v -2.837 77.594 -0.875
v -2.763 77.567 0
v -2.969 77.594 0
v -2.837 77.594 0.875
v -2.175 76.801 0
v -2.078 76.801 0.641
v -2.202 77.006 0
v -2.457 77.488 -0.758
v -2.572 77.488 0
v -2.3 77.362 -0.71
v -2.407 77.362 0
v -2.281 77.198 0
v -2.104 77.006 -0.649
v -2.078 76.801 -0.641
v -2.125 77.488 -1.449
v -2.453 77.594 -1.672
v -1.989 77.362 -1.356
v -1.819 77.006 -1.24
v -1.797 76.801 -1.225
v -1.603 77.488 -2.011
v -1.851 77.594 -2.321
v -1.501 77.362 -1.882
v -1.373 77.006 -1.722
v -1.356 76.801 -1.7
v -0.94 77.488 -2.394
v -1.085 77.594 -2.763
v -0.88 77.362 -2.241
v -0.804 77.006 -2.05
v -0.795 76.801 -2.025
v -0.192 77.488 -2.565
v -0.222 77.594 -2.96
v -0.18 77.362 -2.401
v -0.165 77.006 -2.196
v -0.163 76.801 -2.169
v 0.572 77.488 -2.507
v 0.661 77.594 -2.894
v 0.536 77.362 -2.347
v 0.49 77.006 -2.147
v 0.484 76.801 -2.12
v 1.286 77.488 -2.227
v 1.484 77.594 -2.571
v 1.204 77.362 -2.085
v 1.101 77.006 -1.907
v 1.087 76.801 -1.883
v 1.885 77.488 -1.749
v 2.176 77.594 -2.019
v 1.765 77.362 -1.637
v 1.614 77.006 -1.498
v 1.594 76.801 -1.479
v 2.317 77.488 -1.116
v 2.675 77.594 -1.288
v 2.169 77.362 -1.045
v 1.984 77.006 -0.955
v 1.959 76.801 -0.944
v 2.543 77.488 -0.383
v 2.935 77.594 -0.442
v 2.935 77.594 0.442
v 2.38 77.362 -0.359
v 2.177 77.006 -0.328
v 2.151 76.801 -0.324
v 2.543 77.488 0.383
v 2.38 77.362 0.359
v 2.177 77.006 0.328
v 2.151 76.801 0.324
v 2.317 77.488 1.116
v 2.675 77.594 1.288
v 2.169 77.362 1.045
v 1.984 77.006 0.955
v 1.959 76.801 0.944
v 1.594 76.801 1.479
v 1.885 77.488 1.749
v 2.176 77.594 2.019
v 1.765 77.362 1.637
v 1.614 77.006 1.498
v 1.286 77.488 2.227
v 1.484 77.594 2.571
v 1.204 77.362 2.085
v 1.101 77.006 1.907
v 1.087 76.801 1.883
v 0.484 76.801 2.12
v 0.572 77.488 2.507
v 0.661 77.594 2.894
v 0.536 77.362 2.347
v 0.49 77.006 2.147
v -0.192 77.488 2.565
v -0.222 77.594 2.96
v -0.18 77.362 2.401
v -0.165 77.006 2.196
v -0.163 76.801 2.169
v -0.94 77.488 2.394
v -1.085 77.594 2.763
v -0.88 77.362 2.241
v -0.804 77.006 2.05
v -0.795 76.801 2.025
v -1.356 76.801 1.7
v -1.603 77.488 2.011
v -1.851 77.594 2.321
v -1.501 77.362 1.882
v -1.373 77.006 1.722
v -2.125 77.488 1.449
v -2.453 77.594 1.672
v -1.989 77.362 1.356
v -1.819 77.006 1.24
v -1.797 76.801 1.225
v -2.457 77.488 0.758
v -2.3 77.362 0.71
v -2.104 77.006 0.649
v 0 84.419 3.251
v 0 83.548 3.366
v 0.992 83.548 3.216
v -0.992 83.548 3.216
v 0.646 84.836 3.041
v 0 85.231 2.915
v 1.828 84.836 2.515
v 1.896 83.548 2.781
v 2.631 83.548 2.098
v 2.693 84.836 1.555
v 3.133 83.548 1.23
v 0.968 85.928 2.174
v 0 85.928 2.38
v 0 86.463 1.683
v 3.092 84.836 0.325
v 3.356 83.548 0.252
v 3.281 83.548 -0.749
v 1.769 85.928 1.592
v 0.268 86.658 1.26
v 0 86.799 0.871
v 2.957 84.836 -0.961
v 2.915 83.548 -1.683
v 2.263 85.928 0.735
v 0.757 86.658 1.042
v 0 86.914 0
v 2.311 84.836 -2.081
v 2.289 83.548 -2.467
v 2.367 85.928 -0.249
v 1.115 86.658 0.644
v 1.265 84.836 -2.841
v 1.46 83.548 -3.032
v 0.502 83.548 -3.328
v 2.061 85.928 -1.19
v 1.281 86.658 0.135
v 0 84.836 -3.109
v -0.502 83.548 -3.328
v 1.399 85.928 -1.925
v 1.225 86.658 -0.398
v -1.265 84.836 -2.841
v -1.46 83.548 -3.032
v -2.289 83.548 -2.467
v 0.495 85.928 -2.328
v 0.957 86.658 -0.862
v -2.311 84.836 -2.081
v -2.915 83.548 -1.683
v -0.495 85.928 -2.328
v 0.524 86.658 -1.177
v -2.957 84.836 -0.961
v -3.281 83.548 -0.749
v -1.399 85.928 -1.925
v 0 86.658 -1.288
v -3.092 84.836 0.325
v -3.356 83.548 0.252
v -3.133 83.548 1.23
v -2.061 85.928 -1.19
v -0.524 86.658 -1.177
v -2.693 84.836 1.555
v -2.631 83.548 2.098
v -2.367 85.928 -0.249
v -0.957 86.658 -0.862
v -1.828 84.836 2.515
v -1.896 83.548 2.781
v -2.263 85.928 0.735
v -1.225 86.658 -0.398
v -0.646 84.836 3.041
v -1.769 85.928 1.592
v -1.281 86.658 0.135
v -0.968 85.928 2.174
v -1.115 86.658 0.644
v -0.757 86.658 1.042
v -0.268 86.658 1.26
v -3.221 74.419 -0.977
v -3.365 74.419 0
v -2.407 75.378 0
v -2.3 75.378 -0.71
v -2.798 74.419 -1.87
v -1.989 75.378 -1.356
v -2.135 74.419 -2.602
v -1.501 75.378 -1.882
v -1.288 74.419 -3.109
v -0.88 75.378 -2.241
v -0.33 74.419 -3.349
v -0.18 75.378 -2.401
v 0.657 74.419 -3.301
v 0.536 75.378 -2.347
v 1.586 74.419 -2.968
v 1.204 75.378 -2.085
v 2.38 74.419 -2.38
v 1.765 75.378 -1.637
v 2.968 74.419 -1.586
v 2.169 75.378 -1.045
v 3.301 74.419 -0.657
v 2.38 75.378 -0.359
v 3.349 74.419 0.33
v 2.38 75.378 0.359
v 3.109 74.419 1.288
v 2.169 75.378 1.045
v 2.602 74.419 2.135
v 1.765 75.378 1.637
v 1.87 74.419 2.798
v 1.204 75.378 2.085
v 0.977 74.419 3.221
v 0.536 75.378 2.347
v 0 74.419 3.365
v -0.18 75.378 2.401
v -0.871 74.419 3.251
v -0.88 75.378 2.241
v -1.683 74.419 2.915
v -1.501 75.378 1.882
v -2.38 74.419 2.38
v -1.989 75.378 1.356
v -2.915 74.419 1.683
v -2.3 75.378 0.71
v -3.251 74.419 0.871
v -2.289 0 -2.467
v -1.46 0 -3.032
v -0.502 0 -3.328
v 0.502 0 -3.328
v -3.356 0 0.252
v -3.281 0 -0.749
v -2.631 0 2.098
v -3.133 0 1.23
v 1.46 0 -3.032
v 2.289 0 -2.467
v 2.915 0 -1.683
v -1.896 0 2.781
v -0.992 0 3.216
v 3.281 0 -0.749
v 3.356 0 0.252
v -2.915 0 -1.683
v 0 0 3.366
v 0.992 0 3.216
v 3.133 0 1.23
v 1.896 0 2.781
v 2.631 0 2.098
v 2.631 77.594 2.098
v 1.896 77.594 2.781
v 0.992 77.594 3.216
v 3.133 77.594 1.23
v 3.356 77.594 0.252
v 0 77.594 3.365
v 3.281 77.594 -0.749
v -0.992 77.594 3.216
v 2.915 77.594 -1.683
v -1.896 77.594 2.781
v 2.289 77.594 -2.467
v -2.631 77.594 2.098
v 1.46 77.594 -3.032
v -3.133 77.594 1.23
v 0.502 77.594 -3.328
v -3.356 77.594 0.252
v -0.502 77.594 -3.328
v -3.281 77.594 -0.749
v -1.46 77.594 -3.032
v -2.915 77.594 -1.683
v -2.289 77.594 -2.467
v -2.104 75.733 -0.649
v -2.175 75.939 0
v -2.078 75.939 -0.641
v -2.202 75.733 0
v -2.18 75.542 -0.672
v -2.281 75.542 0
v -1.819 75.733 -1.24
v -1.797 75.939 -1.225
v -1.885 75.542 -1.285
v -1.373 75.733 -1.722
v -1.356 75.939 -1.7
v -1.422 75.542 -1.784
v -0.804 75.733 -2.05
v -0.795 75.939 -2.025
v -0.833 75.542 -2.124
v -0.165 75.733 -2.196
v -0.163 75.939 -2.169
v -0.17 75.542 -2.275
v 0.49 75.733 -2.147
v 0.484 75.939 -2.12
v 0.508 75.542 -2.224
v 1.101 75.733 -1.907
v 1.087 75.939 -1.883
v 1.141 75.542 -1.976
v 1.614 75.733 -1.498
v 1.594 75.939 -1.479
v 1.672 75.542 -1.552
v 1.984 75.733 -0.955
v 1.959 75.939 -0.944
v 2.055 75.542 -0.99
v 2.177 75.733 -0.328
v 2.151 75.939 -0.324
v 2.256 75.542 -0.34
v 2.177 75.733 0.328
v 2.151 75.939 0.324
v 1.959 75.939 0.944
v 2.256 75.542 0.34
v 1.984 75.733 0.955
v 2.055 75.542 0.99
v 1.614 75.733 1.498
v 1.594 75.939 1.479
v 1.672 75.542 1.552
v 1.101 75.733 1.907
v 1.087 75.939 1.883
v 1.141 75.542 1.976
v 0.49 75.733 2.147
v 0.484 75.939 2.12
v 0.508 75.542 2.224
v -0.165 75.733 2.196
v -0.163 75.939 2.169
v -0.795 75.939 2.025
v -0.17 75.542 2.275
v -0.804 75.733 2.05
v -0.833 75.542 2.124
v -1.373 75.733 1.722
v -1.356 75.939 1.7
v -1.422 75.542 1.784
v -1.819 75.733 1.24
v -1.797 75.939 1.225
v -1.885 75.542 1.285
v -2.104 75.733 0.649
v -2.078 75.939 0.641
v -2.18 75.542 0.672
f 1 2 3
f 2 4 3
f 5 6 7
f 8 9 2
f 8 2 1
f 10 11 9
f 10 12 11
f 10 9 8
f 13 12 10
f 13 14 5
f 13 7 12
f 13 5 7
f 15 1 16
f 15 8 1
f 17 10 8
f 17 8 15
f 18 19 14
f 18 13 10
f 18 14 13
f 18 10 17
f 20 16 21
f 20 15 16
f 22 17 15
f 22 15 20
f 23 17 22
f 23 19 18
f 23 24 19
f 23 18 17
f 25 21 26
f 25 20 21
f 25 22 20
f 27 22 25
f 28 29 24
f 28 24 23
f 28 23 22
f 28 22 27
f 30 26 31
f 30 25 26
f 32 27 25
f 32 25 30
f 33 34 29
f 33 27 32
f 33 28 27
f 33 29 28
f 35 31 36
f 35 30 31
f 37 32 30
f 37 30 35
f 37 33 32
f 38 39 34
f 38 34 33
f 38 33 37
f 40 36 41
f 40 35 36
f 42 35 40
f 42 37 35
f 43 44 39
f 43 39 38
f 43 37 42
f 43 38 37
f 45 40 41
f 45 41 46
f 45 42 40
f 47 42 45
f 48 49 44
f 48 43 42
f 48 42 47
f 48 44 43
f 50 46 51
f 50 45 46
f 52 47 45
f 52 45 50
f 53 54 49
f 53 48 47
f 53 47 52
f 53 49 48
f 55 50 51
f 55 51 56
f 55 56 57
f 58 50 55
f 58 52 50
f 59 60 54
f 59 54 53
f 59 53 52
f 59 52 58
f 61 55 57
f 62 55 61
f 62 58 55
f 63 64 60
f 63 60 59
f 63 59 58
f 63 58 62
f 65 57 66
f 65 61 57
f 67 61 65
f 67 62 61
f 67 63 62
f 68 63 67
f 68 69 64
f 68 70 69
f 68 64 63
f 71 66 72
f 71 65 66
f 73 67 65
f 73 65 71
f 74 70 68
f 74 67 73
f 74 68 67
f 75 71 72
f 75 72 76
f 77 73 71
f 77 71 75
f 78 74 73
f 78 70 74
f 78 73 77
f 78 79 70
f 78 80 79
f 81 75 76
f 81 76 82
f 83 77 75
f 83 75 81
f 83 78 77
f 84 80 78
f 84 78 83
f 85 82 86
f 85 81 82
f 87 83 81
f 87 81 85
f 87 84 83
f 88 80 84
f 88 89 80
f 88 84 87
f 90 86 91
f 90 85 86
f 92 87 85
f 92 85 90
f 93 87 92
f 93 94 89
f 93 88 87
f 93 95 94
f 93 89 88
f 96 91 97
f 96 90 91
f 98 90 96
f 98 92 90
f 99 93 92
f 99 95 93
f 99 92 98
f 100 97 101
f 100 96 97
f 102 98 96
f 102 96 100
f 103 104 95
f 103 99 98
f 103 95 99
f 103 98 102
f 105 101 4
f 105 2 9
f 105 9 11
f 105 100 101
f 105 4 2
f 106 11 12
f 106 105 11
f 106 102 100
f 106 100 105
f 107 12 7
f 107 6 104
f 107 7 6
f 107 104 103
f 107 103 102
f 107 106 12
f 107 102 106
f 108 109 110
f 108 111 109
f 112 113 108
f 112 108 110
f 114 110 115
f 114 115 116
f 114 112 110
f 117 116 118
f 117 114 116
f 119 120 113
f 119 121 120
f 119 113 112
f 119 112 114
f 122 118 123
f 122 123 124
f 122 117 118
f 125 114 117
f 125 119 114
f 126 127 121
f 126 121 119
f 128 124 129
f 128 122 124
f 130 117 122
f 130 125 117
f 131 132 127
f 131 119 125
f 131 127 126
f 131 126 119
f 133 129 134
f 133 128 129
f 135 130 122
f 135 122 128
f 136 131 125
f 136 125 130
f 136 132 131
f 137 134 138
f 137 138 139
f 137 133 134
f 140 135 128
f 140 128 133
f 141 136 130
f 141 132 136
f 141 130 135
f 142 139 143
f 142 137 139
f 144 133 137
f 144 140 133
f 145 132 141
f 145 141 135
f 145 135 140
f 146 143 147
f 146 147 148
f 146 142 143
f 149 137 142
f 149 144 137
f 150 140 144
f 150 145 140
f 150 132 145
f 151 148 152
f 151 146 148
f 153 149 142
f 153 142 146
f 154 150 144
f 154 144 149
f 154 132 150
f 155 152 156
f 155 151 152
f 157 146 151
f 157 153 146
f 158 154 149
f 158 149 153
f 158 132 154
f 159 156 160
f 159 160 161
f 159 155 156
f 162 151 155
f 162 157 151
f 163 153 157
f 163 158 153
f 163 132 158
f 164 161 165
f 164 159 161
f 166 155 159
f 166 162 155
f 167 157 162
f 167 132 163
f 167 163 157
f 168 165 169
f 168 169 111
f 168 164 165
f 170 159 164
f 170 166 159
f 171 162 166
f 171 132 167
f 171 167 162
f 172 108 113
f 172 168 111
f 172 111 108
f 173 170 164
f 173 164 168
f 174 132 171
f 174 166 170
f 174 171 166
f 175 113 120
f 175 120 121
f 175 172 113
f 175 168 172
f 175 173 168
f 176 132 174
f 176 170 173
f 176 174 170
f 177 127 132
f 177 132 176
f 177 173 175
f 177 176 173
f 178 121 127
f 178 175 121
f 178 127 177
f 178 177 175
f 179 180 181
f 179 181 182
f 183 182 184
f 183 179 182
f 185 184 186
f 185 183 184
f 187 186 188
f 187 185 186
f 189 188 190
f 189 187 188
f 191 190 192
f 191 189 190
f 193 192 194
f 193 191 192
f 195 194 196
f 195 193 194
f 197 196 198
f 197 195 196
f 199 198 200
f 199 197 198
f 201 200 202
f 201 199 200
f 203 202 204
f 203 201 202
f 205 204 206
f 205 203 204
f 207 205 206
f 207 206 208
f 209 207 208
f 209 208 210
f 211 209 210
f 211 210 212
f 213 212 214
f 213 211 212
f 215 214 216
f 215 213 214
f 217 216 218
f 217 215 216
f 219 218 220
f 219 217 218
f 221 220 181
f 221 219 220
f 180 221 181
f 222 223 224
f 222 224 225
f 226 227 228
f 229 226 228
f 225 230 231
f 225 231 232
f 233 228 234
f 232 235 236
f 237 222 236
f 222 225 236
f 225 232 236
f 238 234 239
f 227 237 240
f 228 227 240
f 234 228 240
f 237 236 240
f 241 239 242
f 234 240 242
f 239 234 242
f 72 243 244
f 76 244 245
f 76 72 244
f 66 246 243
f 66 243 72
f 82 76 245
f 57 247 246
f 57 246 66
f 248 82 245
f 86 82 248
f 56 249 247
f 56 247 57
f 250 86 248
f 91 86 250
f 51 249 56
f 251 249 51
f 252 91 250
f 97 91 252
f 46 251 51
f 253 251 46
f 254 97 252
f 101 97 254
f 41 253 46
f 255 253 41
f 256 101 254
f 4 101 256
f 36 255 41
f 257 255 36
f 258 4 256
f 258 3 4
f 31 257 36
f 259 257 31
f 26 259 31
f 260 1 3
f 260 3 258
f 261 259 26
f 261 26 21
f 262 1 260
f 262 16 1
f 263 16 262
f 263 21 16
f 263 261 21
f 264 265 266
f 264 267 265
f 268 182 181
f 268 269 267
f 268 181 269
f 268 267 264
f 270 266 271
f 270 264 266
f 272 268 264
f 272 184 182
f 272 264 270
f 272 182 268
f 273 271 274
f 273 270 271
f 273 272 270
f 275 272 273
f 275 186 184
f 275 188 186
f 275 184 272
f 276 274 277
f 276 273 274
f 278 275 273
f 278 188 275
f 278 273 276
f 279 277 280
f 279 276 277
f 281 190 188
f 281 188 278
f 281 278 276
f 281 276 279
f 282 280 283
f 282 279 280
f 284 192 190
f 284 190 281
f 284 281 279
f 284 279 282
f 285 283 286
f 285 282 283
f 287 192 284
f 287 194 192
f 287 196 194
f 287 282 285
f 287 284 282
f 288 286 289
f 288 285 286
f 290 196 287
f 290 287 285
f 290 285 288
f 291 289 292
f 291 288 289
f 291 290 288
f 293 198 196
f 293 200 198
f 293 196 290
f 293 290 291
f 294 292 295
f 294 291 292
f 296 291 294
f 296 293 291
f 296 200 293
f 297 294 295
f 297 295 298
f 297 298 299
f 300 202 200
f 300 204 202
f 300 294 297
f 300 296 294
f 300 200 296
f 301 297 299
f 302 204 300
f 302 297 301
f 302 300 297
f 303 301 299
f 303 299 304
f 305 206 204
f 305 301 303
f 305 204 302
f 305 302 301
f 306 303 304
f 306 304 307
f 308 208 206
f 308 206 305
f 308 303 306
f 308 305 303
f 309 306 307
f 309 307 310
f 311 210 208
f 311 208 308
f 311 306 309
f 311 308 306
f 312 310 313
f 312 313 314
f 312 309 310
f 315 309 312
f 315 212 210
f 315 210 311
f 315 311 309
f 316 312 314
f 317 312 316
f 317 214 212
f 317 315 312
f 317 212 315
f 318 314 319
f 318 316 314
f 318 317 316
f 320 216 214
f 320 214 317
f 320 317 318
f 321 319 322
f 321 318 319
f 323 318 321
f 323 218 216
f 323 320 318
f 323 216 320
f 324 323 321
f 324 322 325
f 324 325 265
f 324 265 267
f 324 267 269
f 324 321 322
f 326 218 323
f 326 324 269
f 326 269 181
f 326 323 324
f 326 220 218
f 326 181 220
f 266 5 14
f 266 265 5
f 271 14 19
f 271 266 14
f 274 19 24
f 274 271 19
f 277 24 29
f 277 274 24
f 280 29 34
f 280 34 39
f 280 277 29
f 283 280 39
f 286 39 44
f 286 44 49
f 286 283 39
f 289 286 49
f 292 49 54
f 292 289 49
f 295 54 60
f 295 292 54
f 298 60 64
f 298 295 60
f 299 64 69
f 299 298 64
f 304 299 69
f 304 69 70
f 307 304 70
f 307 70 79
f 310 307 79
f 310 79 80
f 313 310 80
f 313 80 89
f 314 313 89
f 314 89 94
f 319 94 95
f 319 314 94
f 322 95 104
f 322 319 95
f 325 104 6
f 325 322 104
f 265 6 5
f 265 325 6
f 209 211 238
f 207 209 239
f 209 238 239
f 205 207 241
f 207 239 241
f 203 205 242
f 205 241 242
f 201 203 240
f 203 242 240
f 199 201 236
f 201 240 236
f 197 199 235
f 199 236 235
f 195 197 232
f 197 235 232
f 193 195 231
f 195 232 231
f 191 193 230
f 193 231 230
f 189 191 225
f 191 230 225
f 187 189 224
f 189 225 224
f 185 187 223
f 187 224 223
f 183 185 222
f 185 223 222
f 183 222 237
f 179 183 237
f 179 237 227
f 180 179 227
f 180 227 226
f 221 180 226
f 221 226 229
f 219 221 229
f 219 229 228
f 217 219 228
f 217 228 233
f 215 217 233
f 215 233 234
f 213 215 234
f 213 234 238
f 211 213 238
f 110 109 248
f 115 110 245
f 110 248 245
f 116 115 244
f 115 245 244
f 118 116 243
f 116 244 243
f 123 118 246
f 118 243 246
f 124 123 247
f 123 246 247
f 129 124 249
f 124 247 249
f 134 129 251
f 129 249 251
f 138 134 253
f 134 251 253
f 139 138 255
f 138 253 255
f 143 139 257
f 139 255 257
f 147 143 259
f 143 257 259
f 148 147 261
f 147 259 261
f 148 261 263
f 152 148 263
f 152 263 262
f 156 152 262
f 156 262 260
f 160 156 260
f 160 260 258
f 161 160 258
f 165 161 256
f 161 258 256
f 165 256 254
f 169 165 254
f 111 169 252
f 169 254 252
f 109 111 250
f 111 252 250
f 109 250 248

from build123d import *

# Parameters (mm, degrees)
SKETCH1_R           = 3.3655
BOSS_EXTRUDE1_DEPTH = 86.91372
FILLET1_R           = 3.3655


with BuildPart() as part:
    # Sketch1 → Boss-Extrude1 (new body)
    with BuildSketch(Plane(origin=(0, 0, 0), x_dir=(1, 0, 0), z_dir=(0, 1, 0))):
        with Locations(Location((0, 0, 0), (0, 0, 270))):
            Circle(SKETCH1_R)
    extrude(amount=BOSS_EXTRUDE1_DEPTH)

    # Sketch2 → Cut-Revolve2 (revolve, cut)
    with BuildSketch(Plane(origin=(48.790895882, 11.267332823, -12.664317923), x_dir=(0.9679254058512238, 0, -0.2512377533487826), z_dir=(0.2512377533487826, 0, 0.9679254058512238)), mode=Mode.PRIVATE) as cut_revolve2_sk:
        with BuildLine():
            Line((-53.773202481, 66.327127177), (-53.376327481, 66.327127177))
            ThreePointArc((-53.376327481, 66.327127177), (-52.815061473, 66.094643184), (-52.582577481, 65.533377177))
            Line((-52.582577481, 65.533377177), (-52.582577481, 64.671534192))
            ThreePointArc((-52.582577481, 64.671534192), (-52.642998102, 64.367779217), (-52.815061473, 64.110268184))
            Line((-52.815061473, 64.110268184), (-53.773202481, 63.152127177))
            Line((-53.773202481, 63.152127177), (-53.773202481, 66.327127177))
        make_face()
    revolve(cut_revolve2_sk.sketch.rotate(Axis((0, 86.91372, 0), (0, -1, 0)), 14.550768137), axis=Axis((0, 86.91372, 0), (0, -1, 0)), mode=Mode.SUBTRACT)

    # Fillet1
    fillet1_edges = [part.edges().sort_by_distance(p)[0] for p in [
        (0, 86.91372, -3.3655),
    ]]
    fillet(fillet1_edges, radius=FILLET1_R)


solid = part.part
